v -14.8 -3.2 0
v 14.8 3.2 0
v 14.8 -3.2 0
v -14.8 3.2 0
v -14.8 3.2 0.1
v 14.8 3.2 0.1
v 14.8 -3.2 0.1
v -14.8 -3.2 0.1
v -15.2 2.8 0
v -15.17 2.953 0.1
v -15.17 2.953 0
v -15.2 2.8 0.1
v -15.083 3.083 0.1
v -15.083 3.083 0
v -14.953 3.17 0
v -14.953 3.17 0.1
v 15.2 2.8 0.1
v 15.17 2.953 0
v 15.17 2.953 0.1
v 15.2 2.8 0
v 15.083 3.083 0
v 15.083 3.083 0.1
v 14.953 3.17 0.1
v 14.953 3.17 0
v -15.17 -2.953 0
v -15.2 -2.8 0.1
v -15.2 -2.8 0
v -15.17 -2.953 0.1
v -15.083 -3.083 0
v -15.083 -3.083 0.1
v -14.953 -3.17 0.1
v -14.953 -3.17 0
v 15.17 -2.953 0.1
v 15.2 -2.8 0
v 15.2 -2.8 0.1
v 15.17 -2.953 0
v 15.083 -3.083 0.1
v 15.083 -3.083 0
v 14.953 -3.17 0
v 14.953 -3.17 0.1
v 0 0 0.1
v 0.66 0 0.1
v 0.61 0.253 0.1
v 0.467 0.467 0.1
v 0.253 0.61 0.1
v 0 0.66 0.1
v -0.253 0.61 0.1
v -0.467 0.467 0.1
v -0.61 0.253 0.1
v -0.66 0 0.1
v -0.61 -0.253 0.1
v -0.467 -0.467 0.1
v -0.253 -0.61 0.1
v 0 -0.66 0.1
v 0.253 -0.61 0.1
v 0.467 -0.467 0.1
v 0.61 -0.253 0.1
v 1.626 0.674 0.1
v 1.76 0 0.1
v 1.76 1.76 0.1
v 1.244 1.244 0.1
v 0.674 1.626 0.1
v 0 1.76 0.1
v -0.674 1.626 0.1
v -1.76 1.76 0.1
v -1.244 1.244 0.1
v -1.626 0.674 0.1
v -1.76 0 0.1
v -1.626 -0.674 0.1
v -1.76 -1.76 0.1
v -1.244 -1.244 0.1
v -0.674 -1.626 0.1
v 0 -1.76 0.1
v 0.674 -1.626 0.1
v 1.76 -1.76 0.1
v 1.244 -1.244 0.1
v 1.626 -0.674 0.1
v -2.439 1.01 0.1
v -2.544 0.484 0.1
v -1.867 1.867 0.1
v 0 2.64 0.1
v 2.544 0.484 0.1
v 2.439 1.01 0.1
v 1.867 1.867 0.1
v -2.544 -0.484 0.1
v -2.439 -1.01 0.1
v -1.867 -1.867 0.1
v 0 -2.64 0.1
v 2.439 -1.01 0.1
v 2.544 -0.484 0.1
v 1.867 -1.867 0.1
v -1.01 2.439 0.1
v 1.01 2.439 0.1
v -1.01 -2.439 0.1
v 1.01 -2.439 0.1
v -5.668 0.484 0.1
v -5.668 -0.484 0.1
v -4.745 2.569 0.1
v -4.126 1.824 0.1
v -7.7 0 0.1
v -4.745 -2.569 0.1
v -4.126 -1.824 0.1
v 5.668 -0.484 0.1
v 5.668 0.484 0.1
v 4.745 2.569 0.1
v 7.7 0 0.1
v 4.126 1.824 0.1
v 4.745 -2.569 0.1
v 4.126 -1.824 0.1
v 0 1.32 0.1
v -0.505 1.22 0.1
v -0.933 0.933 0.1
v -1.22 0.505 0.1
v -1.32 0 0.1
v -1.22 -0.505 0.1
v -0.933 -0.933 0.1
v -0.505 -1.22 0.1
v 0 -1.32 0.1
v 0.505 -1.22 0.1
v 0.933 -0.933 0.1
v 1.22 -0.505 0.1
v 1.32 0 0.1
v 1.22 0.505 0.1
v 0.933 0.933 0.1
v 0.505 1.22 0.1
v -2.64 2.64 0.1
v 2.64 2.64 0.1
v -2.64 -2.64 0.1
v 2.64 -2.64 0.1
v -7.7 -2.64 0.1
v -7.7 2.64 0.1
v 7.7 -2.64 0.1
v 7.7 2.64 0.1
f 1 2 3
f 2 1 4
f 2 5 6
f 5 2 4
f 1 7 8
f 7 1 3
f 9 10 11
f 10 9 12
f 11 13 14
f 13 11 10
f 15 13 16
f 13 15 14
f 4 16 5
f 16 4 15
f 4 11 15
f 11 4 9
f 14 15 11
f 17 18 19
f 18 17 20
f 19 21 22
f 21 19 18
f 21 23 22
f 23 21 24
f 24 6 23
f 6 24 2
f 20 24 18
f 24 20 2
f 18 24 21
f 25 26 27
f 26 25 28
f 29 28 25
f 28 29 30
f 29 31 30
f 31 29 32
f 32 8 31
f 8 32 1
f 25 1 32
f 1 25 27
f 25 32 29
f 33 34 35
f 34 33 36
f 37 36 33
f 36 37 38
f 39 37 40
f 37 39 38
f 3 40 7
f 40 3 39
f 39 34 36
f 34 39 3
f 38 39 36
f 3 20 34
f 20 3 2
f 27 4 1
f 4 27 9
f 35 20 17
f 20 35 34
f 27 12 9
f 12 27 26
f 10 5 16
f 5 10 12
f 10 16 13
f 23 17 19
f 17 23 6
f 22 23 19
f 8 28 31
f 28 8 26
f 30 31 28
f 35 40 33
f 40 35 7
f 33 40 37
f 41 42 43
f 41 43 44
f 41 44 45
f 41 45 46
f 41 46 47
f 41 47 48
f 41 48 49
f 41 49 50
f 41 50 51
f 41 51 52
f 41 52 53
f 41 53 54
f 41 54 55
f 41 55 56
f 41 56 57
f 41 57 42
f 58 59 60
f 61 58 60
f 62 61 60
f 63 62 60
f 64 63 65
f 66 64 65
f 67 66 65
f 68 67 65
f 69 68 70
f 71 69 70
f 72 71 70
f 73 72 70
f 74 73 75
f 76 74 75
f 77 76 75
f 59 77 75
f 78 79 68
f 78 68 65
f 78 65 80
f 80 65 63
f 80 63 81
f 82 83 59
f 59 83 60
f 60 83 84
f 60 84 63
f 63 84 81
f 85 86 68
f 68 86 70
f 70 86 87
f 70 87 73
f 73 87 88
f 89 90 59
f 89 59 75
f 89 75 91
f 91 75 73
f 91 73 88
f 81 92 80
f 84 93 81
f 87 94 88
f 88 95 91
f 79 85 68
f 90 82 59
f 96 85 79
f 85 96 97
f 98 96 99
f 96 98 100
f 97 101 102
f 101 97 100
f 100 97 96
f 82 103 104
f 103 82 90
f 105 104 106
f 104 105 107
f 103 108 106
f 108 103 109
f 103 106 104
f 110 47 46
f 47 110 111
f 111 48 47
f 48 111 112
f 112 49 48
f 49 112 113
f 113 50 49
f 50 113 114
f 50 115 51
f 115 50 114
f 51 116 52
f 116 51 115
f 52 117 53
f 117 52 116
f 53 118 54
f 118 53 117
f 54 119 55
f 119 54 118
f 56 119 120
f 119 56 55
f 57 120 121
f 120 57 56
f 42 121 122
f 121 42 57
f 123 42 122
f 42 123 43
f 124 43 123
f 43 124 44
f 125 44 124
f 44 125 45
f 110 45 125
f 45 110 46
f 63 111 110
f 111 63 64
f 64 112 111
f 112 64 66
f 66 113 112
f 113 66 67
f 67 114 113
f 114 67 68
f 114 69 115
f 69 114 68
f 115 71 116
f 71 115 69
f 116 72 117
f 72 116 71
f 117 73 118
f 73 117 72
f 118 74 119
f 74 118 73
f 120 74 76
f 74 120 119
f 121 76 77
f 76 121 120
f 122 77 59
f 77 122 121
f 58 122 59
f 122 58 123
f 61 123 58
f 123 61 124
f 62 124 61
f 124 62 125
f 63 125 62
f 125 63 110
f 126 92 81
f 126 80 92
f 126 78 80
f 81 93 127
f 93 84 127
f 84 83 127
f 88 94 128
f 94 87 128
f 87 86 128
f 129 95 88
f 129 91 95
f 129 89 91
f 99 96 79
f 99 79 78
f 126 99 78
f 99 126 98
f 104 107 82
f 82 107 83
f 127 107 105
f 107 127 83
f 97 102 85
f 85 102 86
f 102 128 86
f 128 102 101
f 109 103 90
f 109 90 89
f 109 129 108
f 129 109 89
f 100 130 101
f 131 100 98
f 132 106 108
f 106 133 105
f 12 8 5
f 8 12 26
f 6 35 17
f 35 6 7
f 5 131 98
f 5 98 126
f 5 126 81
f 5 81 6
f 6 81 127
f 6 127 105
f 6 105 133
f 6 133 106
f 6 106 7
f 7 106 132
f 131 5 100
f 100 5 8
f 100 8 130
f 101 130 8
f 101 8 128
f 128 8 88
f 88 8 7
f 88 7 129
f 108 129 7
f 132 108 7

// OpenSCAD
// file: ../p/empty.scad
use <../lib.scad>
function ldraw_lib__empty() = [
// 0 Empty
// 0 Name: empty.dat
// 0 Author: Steffen [Steffen]
// 0 !LDRAW_ORG Primitive UPDATE 2015-01
// 0 !LICENSE Licensed under CC BY 4.0 : see CAreadme.txt
// 
// 0 BFC CERTIFY CCW
  [0,"BFC","CERTIFY"],
  [0,"BFC","CCW"],
// 
// 0 !HISTORY 2015-10-11 [PTadmin] Official Update 2015-01
// 
// 
// 0 // Tool MLCad cannot handle really empty files. This file is used as a workaround.
// 0 // It exceptionally contains forbidden non-LDRAW standard syntax to satisfy MLCad until it is fixed OR a different editor has become the de-facto LDRAW standard.
// 0 // The line being used here is an "impossible" conditional line which never should be visible,
// 0 // additionally hidden by a syntax explicitly hiding it from displaying.
// 
// 0 MLCAD HIDE 5 24 0 0 0 0.0001 0 0 0.0001 -0.0001 0 0 0 0
];
module ldraw_lib__empty(step=0, col=false, unit=2/5, alt=false, line=0.2, solid=!$preview)
    makepoly(ldraw_lib__empty(), step=step, col=col, unit=unit, alt=alt, line=line, solid=solid);
ldraw_lib__empty(line=0.2);
// file: ../p/4-4ndis.scad
use <../lib.scad>
function ldraw_lib__4_4ndis() = [
// 0 Disc Negative 1.0
// 0 Name: 4-4ndis.dat
// 0 Author: James Jessiman
// 0 !LDRAW_ORG Primitive UPDATE 2012-01
// 0 !LICENSE Licensed under CC BY 4.0 : see CAreadme.txt
// 
// 0 BFC CERTIFY CCW
  [0,"BFC","CERTIFY"],
  [0,"BFC","CCW"],
// 
// 0 !HISTORY 2002-03-23 [sbliss] Added BFC statement; compacted code
// 0 !HISTORY 2002-04-25 [PTadmin] Official Update 2002-02
// 0 !HISTORY 2007-06-24 [PTadmin] Header formatted for Contributor Agreement
// 0 !HISTORY 2008-07-01 [PTadmin] Official Update 2008-01
// 0 !HISTORY 2012-02-16 [Philo] Changed to CCW
// 0 !HISTORY 2012-03-30 [PTadmin] Official Update 2012-01
// 
// 
// 3 16 0.9239 0 0.3827 1 0 0 1 0 1
  [3,16,0.9239,0,0.3827,1,0,0,1,0,1],
// 3 16 0.7071 0 0.7071 0.9239 0 0.3827 1 0 1
  [3,16,0.7071,0,0.7071,0.9239,0,0.3827,1,0,1],
// 3 16 0.3827 0 0.9239 0.7071 0 0.7071 1 0 1
  [3,16,0.3827,0,0.9239,0.7071,0,0.7071,1,0,1],
// 3 16 0 0 1 0.3827 0 0.9239 1 0 1
  [3,16,0,0,1,0.3827,0,0.9239,1,0,1],
// 3 16 -0.3827 0 0.9239 0 0 1 -1 0 1
  [3,16,-0.3827,0,0.9239,0,0,1,-1,0,1],
// 3 16 -0.7071 0 0.7071 -0.3827 0 0.9239 -1 0 1
  [3,16,-0.7071,0,0.7071,-0.3827,0,0.9239,-1,0,1],
// 3 16 -0.9239 0 0.3827 -0.7071 0 0.7071 -1 0 1
  [3,16,-0.9239,0,0.3827,-0.7071,0,0.7071,-1,0,1],
// 3 16 -1 0 0 -0.9239 0 0.3827 -1 0 1
  [3,16,-1,0,0,-0.9239,0,0.3827,-1,0,1],
// 3 16 -0.9239 0 -0.3827 -1 0 0 -1 0 -1
  [3,16,-0.9239,0,-0.3827,-1,0,0,-1,0,-1],
// 3 16 -0.7071 0 -0.7071 -0.9239 0 -0.3827 -1 0 -1
  [3,16,-0.7071,0,-0.7071,-0.9239,0,-0.3827,-1,0,-1],
// 3 16 -0.3827 0 -0.9239 -0.7071 0 -0.7071 -1 0 -1
  [3,16,-0.3827,0,-0.9239,-0.7071,0,-0.7071,-1,0,-1],
// 3 16 0 0 -1 -0.3827 0 -0.9239 -1 0 -1
  [3,16,0,0,-1,-0.3827,0,-0.9239,-1,0,-1],
// 3 16 0.3827 0 -0.9239 0 0 -1 1 0 -1
  [3,16,0.3827,0,-0.9239,0,0,-1,1,0,-1],
// 3 16 0.7071 0 -0.7071 0.3827 0 -0.9239 1 0 -1
  [3,16,0.7071,0,-0.7071,0.3827,0,-0.9239,1,0,-1],
// 3 16 0.9239 0 -0.3827 0.7071 0 -0.7071 1 0 -1
  [3,16,0.9239,0,-0.3827,0.7071,0,-0.7071,1,0,-1],
// 3 16 1 0 0 0.9239 0 -0.3827 1 0 -1
  [3,16,1,0,0,0.9239,0,-0.3827,1,0,-1],
];
module ldraw_lib__4_4ndis(step=0, col=false, unit=2/5, alt=false, line=0.2, solid=!$preview)
    makepoly(ldraw_lib__4_4ndis(), step=step, col=col, unit=unit, alt=alt, line=line, solid=solid);
ldraw_lib__4_4ndis(line=0.2);
// file: ../p/4-4disc.scad
use <../lib.scad>
function ldraw_lib__4_4disc() = [
// 0 Disc 1.0
// 0 Name: 4-4disc.dat
// 0 Author: James Jessiman
// 0 !LDRAW_ORG Primitive UPDATE 2002-02
// 0 !LICENSE Licensed under CC BY 4.0 : see CAreadme.txt
// 
// 0 BFC CERTIFY CCW
  [0,"BFC","CERTIFY"],
  [0,"BFC","CCW"],
// 
// 0 !HISTORY 1998-12-15 [PTadmin] Official Update 1998-10
// 0 !HISTORY 2002-03-23 [sbliss] Added BFC statement
// 0 !HISTORY 2002-04-25 [PTadmin] Official Update 2002-02
// 0 !HISTORY 2007-06-24 [PTadmin] Header formatted for Contributor Agreement
// 0 !HISTORY 2008-07-01 [PTadmin] Official Update 2008-01
// 
// 
// 3 16 0 0 0 1 0 0 0.9239 0 0.3827
  [3,16,0,0,0,1,0,0,0.9239,0,0.3827],
// 3 16 0 0 0 0.9239 0 0.3827 0.7071 0 0.7071
  [3,16,0,0,0,0.9239,0,0.3827,0.7071,0,0.7071],
// 3 16 0 0 0 0.7071 0 0.7071 0.3827 0 0.9239
  [3,16,0,0,0,0.7071,0,0.7071,0.3827,0,0.9239],
// 3 16 0 0 0 0.3827 0 0.9239 0 0 1
  [3,16,0,0,0,0.3827,0,0.9239,0,0,1],
// 3 16 0 0 0 0 0 1 -0.3827 0 0.9239
  [3,16,0,0,0,0,0,1,-0.3827,0,0.9239],
// 3 16 0 0 0 -0.3827 0 0.9239 -0.7071 0 0.7071
  [3,16,0,0,0,-0.3827,0,0.9239,-0.7071,0,0.7071],
// 3 16 0 0 0 -0.7071 0 0.7071 -0.9239 0 0.3827
  [3,16,0,0,0,-0.7071,0,0.7071,-0.9239,0,0.3827],
// 3 16 0 0 0 -0.9239 0 0.3827 -1 0 -0
  [3,16,0,0,0,-0.9239,0,0.3827,-1,0,-0],
// 3 16 0 0 0 -1 0 -0 -0.9239 0 -0.3827
  [3,16,0,0,0,-1,0,-0,-0.9239,0,-0.3827],
// 3 16 0 0 0 -0.9239 0 -0.3827 -0.7071 0 -0.7071
  [3,16,0,0,0,-0.9239,0,-0.3827,-0.7071,0,-0.7071],
// 3 16 0 0 0 -0.7071 0 -0.7071 -0.3827 0 -0.9239
  [3,16,0,0,0,-0.7071,0,-0.7071,-0.3827,0,-0.9239],
// 3 16 0 0 0 -0.3827 0 -0.9239 0 0 -1
  [3,16,0,0,0,-0.3827,0,-0.9239,0,0,-1],
// 3 16 0 0 0 0 0 -1 0.3827 0 -0.9239
  [3,16,0,0,0,0,0,-1,0.3827,0,-0.9239],
// 3 16 0 0 0 0.3827 0 -0.9239 0.7071 0 -0.7071
  [3,16,0,0,0,0.3827,0,-0.9239,0.7071,0,-0.7071],
// 3 16 0 0 0 0.7071 0 -0.7071 0.9239 0 -0.3827
  [3,16,0,0,0,0.7071,0,-0.7071,0.9239,0,-0.3827],
// 3 16 0 0 0 0.9239 0 -0.3827 1 0 0
  [3,16,0,0,0,0.9239,0,-0.3827,1,0,0],
// 0
];
module ldraw_lib__4_4disc(step=0, col=false, unit=2/5, alt=false, line=0.2, solid=!$preview)
    makepoly(ldraw_lib__4_4disc(), step=step, col=col, unit=unit, alt=alt, line=line, solid=solid);
ldraw_lib__4_4disc(line=0.2);
// file: ../p/1-8chrd.scad
use <../lib.scad>
function ldraw_lib__1_8chrd() = [
// 0 Chord 0.125
// 0 Name: 1-8chrd.dat
// 0 Author: Orion Pobursky [OrionP]
// 0 !LDRAW_ORG Primitive UPDATE 2023-05
// 0 !LICENSE Licensed under CC BY 4.0 : see CAreadme.txt
// 
// 0 BFC CERTIFY CCW
  [0,"BFC","CERTIFY"],
  [0,"BFC","CCW"],
// 
// 0 !HISTORY 2004-04-22 [PTadmin] Official Update 2004-02
// 0 !HISTORY 2007-06-22 [PTadmin] Header formatted for Contributor Agreement
// 0 !HISTORY 2008-07-01 [PTadmin] Official Update 2008-01
// 0 !HISTORY 2023-10-27 [OrionP] Rebuilt with PrimGen2, original author westrate
// 0 !HISTORY 2023-10-31 [OrionP] Official Update 2023-05
// 
// 3 16 1 0 0 0.9239 0 0.3827 0.7071 0 0.7071
  [3,16,1,0,0,0.9239,0,0.3827,0.7071,0,0.7071],
];
module ldraw_lib__1_8chrd(step=0, col=false, unit=2/5, alt=false, line=0.2, solid=!$preview)
    makepoly(ldraw_lib__1_8chrd(), step=step, col=col, unit=unit, alt=alt, line=line, solid=solid);
ldraw_lib__1_8chrd(line=0.2);
// file: ../p/1-16chrd.scad
use <../lib.scad>
use <empty.scad>
function ldraw_lib__1_16chrd() = [
// 0 Chord 0.0625
// 0 Name: 1-16chrd.dat
// 0 Author: Philippe Hurbain [Philo]
// 0 !LDRAW_ORG Primitive UPDATE 2015-01
// 0 !LICENSE Licensed under CC BY 4.0 : see CAreadme.txt
// 
// 0 BFC CERTIFY CCW
  [0,"BFC","CERTIFY"],
  [0,"BFC","CCW"],
// 
// 0 !HISTORY 2015-10-11 [PTadmin] Official Update 2015-01
// 
// 
// 0 // This file is intentionally empty because at the current \P resolution,
// 0 // an 1-16chrd is actually empty. However, this file still is present
// 0 // to allow tools to do primitives substition and fill in a real chrd here,
// 0 // or, if desired, to substitute this with the hi-res 48\1-16chrd.
// 
// 0 // This file is based on an idea by Darats at http://forums.ldraw.org/read.php?19,14500,14500#msg-14500
// 
// 1 16 0 0 0 1 0 0 0 1 0 0 0 1 empty.dat
  [1,16,0,0,0,1,0,0,0,1,0,0,0,1, ldraw_lib__empty()],
];
module ldraw_lib__1_16chrd(step=0, col=false, unit=2/5, alt=false, line=0.2, solid=!$preview)
    makepoly(ldraw_lib__1_16chrd(), step=step, col=col, unit=unit, alt=alt, line=line, solid=solid);
ldraw_lib__1_16chrd(line=0.2);
// file: ../p/4-4ring3.scad
use <../lib.scad>
function ldraw_lib__4_4ring3() = [
// 0 Ring  3 x 1.0
// 0 Name: 4-4ring3.dat
// 0 Author: James Jessiman
// 0 !LDRAW_ORG Primitive UPDATE 2009-01
// 0 !LICENSE Licensed under CC BY 4.0 : see CAreadme.txt
// 
// 0 BFC CERTIFY CCW
  [0,"BFC","CERTIFY"],
  [0,"BFC","CCW"],
// 
// 0 !HISTORY 1998-12-15 [PTadmin] Official Update 1998-10
// 0 !HISTORY 2002-04-05 [hafhead] Added BFC statement
// 0 !HISTORY 2002-04-25 [PTadmin] Official Update 2002-02
// 0 !HISTORY 2007-06-24 [PTadmin] Header formatted for Contributor Agreement
// 0 !HISTORY 2008-07-01 [PTadmin] Official Update 2008-01
// 0 !HISTORY 2008-08-26 [cwdee] Switch polygon winding and rename
// 0 !HISTORY 2009-05-02 [PTadmin] Official Update 2009-01
// 
// 
// 4 16 -1.5308 0 3.6956 -1.1481 0 2.7717 0 0 3 0 0 4
  [4,16,-1.5308,0,3.6956,-1.1481,0,2.7717,0,0,3,0,0,4],
// 4 16 -2.8284 0 2.8284 -2.1213 0 2.1213 -1.1481 0 2.7717 -1.5308 0 3.6956
  [4,16,-2.8284,0,2.8284,-2.1213,0,2.1213,-1.1481,0,2.7717,-1.5308,0,3.6956],
// 4 16 -3.6956 0 1.5308 -2.7717 0 1.1481 -2.1213 0 2.1213 -2.8284 0 2.8284
  [4,16,-3.6956,0,1.5308,-2.7717,0,1.1481,-2.1213,0,2.1213,-2.8284,0,2.8284],
// 4 16 -4 0 0 -3 0 0 -2.7717 0 1.1481 -3.6956 0 1.5308
  [4,16,-4,0,0,-3,0,0,-2.7717,0,1.1481,-3.6956,0,1.5308],
// 4 16 -3.6956 0 -1.5308 -2.7717 0 -1.1481 -3 0 0 -4 0 0
  [4,16,-3.6956,0,-1.5308,-2.7717,0,-1.1481,-3,0,0,-4,0,0],
// 4 16 -2.8284 0 -2.8284 -2.1213 0 -2.1213 -2.7717 0 -1.1481 -3.6956 0 -1.5308
  [4,16,-2.8284,0,-2.8284,-2.1213,0,-2.1213,-2.7717,0,-1.1481,-3.6956,0,-1.5308],
// 4 16 -1.5308 0 -3.6956 -1.1481 0 -2.7717 -2.1213 0 -2.1213 -2.8284 0 -2.8284
  [4,16,-1.5308,0,-3.6956,-1.1481,0,-2.7717,-2.1213,0,-2.1213,-2.8284,0,-2.8284],
// 4 16 0 0 -4 0 0 -3 -1.1481 0 -2.7717 -1.5308 0 -3.6956
  [4,16,0,0,-4,0,0,-3,-1.1481,0,-2.7717,-1.5308,0,-3.6956],
// 4 16 1.5308 0 -3.6956 1.1481 0 -2.7717 0 0 -3 0 0 -4
  [4,16,1.5308,0,-3.6956,1.1481,0,-2.7717,0,0,-3,0,0,-4],
// 4 16 2.8284 0 -2.8284 2.1213 0 -2.1213 1.1481 0 -2.7717 1.5308 0 -3.6956
  [4,16,2.8284,0,-2.8284,2.1213,0,-2.1213,1.1481,0,-2.7717,1.5308,0,-3.6956],
// 4 16 3.6956 0 -1.5308 2.7717 0 -1.1481 2.1213 0 -2.1213 2.8284 0 -2.8284
  [4,16,3.6956,0,-1.5308,2.7717,0,-1.1481,2.1213,0,-2.1213,2.8284,0,-2.8284],
// 4 16 4 0 0 3 0 0 2.7717 0 -1.1481 3.6956 0 -1.5308
  [4,16,4,0,0,3,0,0,2.7717,0,-1.1481,3.6956,0,-1.5308],
// 4 16 3.6956 0 1.5308 2.7717 0 1.1481 3 0 0 4 0 0
  [4,16,3.6956,0,1.5308,2.7717,0,1.1481,3,0,0,4,0,0],
// 4 16 2.8284 0 2.8284 2.1213 0 2.1213 2.7717 0 1.1481 3.6956 0 1.5308
  [4,16,2.8284,0,2.8284,2.1213,0,2.1213,2.7717,0,1.1481,3.6956,0,1.5308],
// 4 16 1.5308 0 3.6956 1.1481 0 2.7717 2.1213 0 2.1213 2.8284 0 2.8284
  [4,16,1.5308,0,3.6956,1.1481,0,2.7717,2.1213,0,2.1213,2.8284,0,2.8284],
// 4 16 0 0 4 0 0 3 1.1481 0 2.7717 1.5308 0 3.6956
  [4,16,0,0,4,0,0,3,1.1481,0,2.7717,1.5308,0,3.6956],
// 0
];
module ldraw_lib__4_4ring3(step=0, col=false, unit=2/5, alt=false, line=0.2, solid=!$preview)
    makepoly(ldraw_lib__4_4ring3(), step=step, col=col, unit=unit, alt=alt, line=line, solid=solid);
ldraw_lib__4_4ring3(line=0.2);
// file: ../p/4-4ring1.scad
use <../lib.scad>
function ldraw_lib__4_4ring1() = [
// 0 Ring  1 x 1.0
// 0 Name: 4-4ring1.dat
// 0 Author: James Jessiman
// 0 !LDRAW_ORG Primitive UPDATE 2009-01
// 0 !LICENSE Licensed under CC BY 4.0 : see CAreadme.txt
// 
// 0 BFC CERTIFY CCW
  [0,"BFC","CERTIFY"],
  [0,"BFC","CCW"],
// 
// 0 !HISTORY 1998-12-15 [PTadmin] Official Update 1998-10
// 0 !HISTORY 2002-04-08 [BrickCaster] Modified for BFC compliance
// 0 !HISTORY 2002-04-25 [PTadmin] Official Update 2002-02
// 0 !HISTORY 2007-06-24 [PTadmin] Header formatted for Contributor Agreement
// 0 !HISTORY 2008-07-01 [PTadmin] Official Update 2008-01
// 0 !HISTORY 2008-08-26 [cwdee] Switch polygon winding and rename
// 0 !HISTORY 2009-05-02 [PTadmin] Official Update 2009-01
// 
// 
// 4 16 -0.7654 0 1.8478 -0.3827 0 0.9239 0 0 1 0 0 2
  [4,16,-0.7654,0,1.8478,-0.3827,0,0.9239,0,0,1,0,0,2],
// 4 16 -1.4142 0 1.4142 -0.7071 0 0.7071 -0.3827 0 0.9239 -0.7654 0 1.8478
  [4,16,-1.4142,0,1.4142,-0.7071,0,0.7071,-0.3827,0,0.9239,-0.7654,0,1.8478],
// 4 16 -1.8478 0 0.7654 -0.9239 0 0.3827 -0.7071 0 0.7071 -1.4142 0 1.41420
  [4,16,-1.8478,0,0.7654,-0.9239,0,0.3827,-0.7071,0,0.7071,-1.4142,0,1.41420],
// 4 16 -2 0 0 -1 0 0 -0.9239 0 0.3827 -1.8478 0 0.7654
  [4,16,-2,0,0,-1,0,0,-0.9239,0,0.3827,-1.8478,0,0.7654],
// 4 16 -1.8478 0 -0.7654 -0.9239 0 -0.3827 -1 0 0 -2 0 0
  [4,16,-1.8478,0,-0.7654,-0.9239,0,-0.3827,-1,0,0,-2,0,0],
// 4 16 -1.4142 0 -1.4142 -0.7071 0 -0.7071 -0.9239 0 -0.3827 -1.8478 0 -0.7654
  [4,16,-1.4142,0,-1.4142,-0.7071,0,-0.7071,-0.9239,0,-0.3827,-1.8478,0,-0.7654],
// 4 16 -0.7654 0 -1.8478 -0.3827 0 -0.9239 -0.7071 0 -0.7071 -1.4142 0 -1.4142
  [4,16,-0.7654,0,-1.8478,-0.3827,0,-0.9239,-0.7071,0,-0.7071,-1.4142,0,-1.4142],
// 4 16 0 0 -2 0 0 -1 -0.3827 0 -0.9239 -0.7654 0 -1.8478
  [4,16,0,0,-2,0,0,-1,-0.3827,0,-0.9239,-0.7654,0,-1.8478],
// 4 16 0.7654 0 -1.8478 0.3827 0 -0.9239 0 0 -1 0 0 -2
  [4,16,0.7654,0,-1.8478,0.3827,0,-0.9239,0,0,-1,0,0,-2],
// 4 16 1.4142 0 -1.4142 0.7071 0 -0.7071 0.3827 0 -0.9239 0.7654 0 -1.8478
  [4,16,1.4142,0,-1.4142,0.7071,0,-0.7071,0.3827,0,-0.9239,0.7654,0,-1.8478],
// 4 16 1.8478 0 -0.7654 0.9239 0 -0.3827 0.7071 0 -0.7071 1.4142 0 -1.4142
  [4,16,1.8478,0,-0.7654,0.9239,0,-0.3827,0.7071,0,-0.7071,1.4142,0,-1.4142],
// 4 16 2 0 0 1 0 0 0.9239 0 -0.3827 1.8478 0 -0.7654
  [4,16,2,0,0,1,0,0,0.9239,0,-0.3827,1.8478,0,-0.7654],
// 4 16 1.8478 0 0.7654 0.9239 0 0.3827 1 0 0 2 0 0
  [4,16,1.8478,0,0.7654,0.9239,0,0.3827,1,0,0,2,0,0],
// 4 16 1.4142 0 1.4142 0.7071 0 0.7071 0.9239 0 0.3827 1.8478 0 0.7654
  [4,16,1.4142,0,1.4142,0.7071,0,0.7071,0.9239,0,0.3827,1.8478,0,0.7654],
// 4 16 0.7654 0 1.8478 0.3827 0 0.9239 0.7071 0 0.7071 1.4142 0 1.4142
  [4,16,0.7654,0,1.8478,0.3827,0,0.9239,0.7071,0,0.7071,1.4142,0,1.4142],
// 4 16 0 0 2 0 0 1 0.3827 0 0.9239 0.7654 0 1.8478
  [4,16,0,0,2,0,0,1,0.3827,0,0.9239,0.7654,0,1.8478],
// 0
];
module ldraw_lib__4_4ring1(step=0, col=false, unit=2/5, alt=false, line=0.2, solid=!$preview)
    makepoly(ldraw_lib__4_4ring1(), step=step, col=col, unit=unit, alt=alt, line=line, solid=solid);
ldraw_lib__4_4ring1(line=0.2);
// file: ../p/3-16ndis.scad
use <../lib.scad>
function ldraw_lib__3_16ndis() = [
// 0 Disc Negative 0.1875
// 0 Name: 3-16ndis.dat
// 0 Author: Guy Vivan [guyvivan]
// 0 !LDRAW_ORG Primitive UPDATE 2009-01
// 0 !LICENSE Licensed under CC BY 2.0 and CC BY 4.0 : see CAreadme.txt
// 
// 0 BFC CERTIFY CCW
  [0,"BFC","CERTIFY"],
  [0,"BFC","CCW"],
// 
// 0 !HISTORY 2009-05-02 [PTadmin] Official Update 2009-01
// 
// 
// 3 16 1 0 1 0.9239 0 0.3827 1 0 0
  [3,16,1,0,1,0.9239,0,0.3827,1,0,0],
// 3 16 1 0 1 0.7071 0 0.7071 0.9239 0 0.3827
  [3,16,1,0,1,0.7071,0,0.7071,0.9239,0,0.3827],
// 3 16 1 0 1 0.3827 0 0.9239 0.7071 0 0.7071
  [3,16,1,0,1,0.3827,0,0.9239,0.7071,0,0.7071],
// 
// 0 end of file
// 
];
module ldraw_lib__3_16ndis(step=0, col=false, unit=2/5, alt=false, line=0.2, solid=!$preview)
    makepoly(ldraw_lib__3_16ndis(), step=step, col=col, unit=unit, alt=alt, line=line, solid=solid);
ldraw_lib__3_16ndis(line=0.2);
// file: ../p/logo-train-2006.scad
use <../lib.scad>
use <1-16chrd.scad>
use <1-8chrd.scad>
use <4-4disc.scad>
use <4-4ndis.scad>
function ldraw_lib__logo_train_2006() = [
// 0 Logo Train 2006
// 0 Name: logo-train-2006.dat
// 0 Author: Gerald Lasser [GeraldLasser]
// 0 !LDRAW_ORG Primitive UPDATE 2023-07
// 0 !LICENSE Licensed under CC BY 4.0 : see CAreadme.txt
// 
// 0 BFC CERTIFY CCW
  [0,"BFC","CERTIFY"],
  [0,"BFC","CCW"],
// 
// 0 !HISTORY 2023-12-31 [OrionP] Official Update 2023-07
// 
// 
// 1 16 0 -.25 0 3 0 0 0 1 0 0 0 3 4-4disc.dat
  [1,16,0,-.25,0,3,0,0,0,1,0,0,0,3, ldraw_lib__4_4disc()],
// 1 16 0 -.25 0 8 0 0 0 1 0 0 0 8 4-4ndis.dat
  [1,16,0,-.25,0,8,0,0,0,1,0,0,0,8, ldraw_lib__4_4ndis()],
// 3 16 -11.0868 -.25 4.5924 -11.5625 -.25 2.2 -8 -.25 0
  [3,16,-11.0868,-.25,4.5924,-11.5625,-.25,2.2,-8,-.25,0],
// 3 16 -11.0868 -.25 4.5924 -8 -.25 0 -8 -.25 8
  [3,16,-11.0868,-.25,4.5924,-8,-.25,0,-8,-.25,8],
// 3 16 -11.0868 -.25 4.5924 -8 -.25 8 -8.4852 -.25 8.4852
  [3,16,-11.0868,-.25,4.5924,-8,-.25,8,-8.4852,-.25,8.4852],
// 3 16 -8.4852 -.25 8.4852 -8 -.25 8 0 -.25 8
  [3,16,-8.4852,-.25,8.4852,-8,-.25,8,0,-.25,8],
// 3 16 -8.4852 -.25 8.4852 0 -.25 8 0 -.25 12
  [3,16,-8.4852,-.25,8.4852,0,-.25,8,0,-.25,12],
// 3 16 11.5625 -.25 2.2 11.0868 -.25 4.5924 8 -.25 0
  [3,16,11.5625,-.25,2.2,11.0868,-.25,4.5924,8,-.25,0],
// 3 16 8 -.25 0 11.0868 -.25 4.5924 8 -.25 8
  [3,16,8,-.25,0,11.0868,-.25,4.5924,8,-.25,8],
// 3 16 8 -.25 8 11.0868 -.25 4.5924 8.4852 -.25 8.4852
  [3,16,8,-.25,8,11.0868,-.25,4.5924,8.4852,-.25,8.4852],
// 3 16 8 -.25 8 8.4852 -.25 8.4852 0 -.25 8
  [3,16,8,-.25,8,8.4852,-.25,8.4852,0,-.25,8],
// 3 16 0 -.25 8 8.4852 -.25 8.4852 0 -.25 12
  [3,16,0,-.25,8,8.4852,-.25,8.4852,0,-.25,12],
// 
// 3 16 -11.5625 -.25 -2.2 -11.0868 -.25 -4.5924 -8 -.25 0
  [3,16,-11.5625,-.25,-2.2,-11.0868,-.25,-4.5924,-8,-.25,0],
// 3 16 -8 -.25 0 -11.0868 -.25 -4.5924 -8 -.25 -8
  [3,16,-8,-.25,0,-11.0868,-.25,-4.5924,-8,-.25,-8],
// 3 16 -8 -.25 -8 -11.0868 -.25 -4.5924 -8.4852 -.25 -8.4852
  [3,16,-8,-.25,-8,-11.0868,-.25,-4.5924,-8.4852,-.25,-8.4852],
// 3 16 -8 -.25 -8 -8.4852 -.25 -8.4852 0 -.25 -8
  [3,16,-8,-.25,-8,-8.4852,-.25,-8.4852,0,-.25,-8],
// 3 16 0 -.25 -8 -8.4852 -.25 -8.4852 0 -.25 -12
  [3,16,0,-.25,-8,-8.4852,-.25,-8.4852,0,-.25,-12],
// 3 16 11.0868 -.25 -4.5924 11.5625 -.25 -2.2 8 -.25 0
  [3,16,11.0868,-.25,-4.5924,11.5625,-.25,-2.2,8,-.25,0],
// 3 16 11.0868 -.25 -4.5924 8 -.25 0 8 -.25 -8
  [3,16,11.0868,-.25,-4.5924,8,-.25,0,8,-.25,-8],
// 3 16 11.0868 -.25 -4.5924 8 -.25 -8 8.4852 -.25 -8.4852
  [3,16,11.0868,-.25,-4.5924,8,-.25,-8,8.4852,-.25,-8.4852],
// 3 16 8.4852 -.25 -8.4852 8 -.25 -8 0 -.25 -8
  [3,16,8.4852,-.25,-8.4852,8,-.25,-8,0,-.25,-8],
// 3 16 8.4852 -.25 -8.4852 0 -.25 -8 0 -.25 -12
  [3,16,8.4852,-.25,-8.4852,0,-.25,-8,0,-.25,-12],
// 
// 1 16 0 -.25 0 0 0 -12 0 1 0 12 0 0 1-8chrd.dat
  [1,16,0,-.25,0,0,0,-12,0,1,0,12,0,0, ldraw_lib__1_8chrd()],
// 1 16 0 -.25 0 0 0 12 0 1 0 12 0 0 1-8chrd.dat
  [1,16,0,-.25,0,0,0,12,0,1,0,12,0,0, ldraw_lib__1_8chrd()],
// 1 16 0 -.25 0 -8.48528 0 -8.48528 0 1 0 8.48528 0 -8.48528 1-16chrd.dat
  [1,16,0,-.25,0,-8.48528,0,-8.48528,0,1,0,8.48528,0,-8.48528, ldraw_lib__1_16chrd()],
// 1 16 0 -.25 0 8.48528 0 8.48528 0 1 0 8.48528 0 -8.48528 1-16chrd.dat
  [1,16,0,-.25,0,8.48528,0,8.48528,0,1,0,8.48528,0,-8.48528, ldraw_lib__1_16chrd()],
// 1 16 0 -.25 0 0 0 -12 0 1 0 -12 0 0 1-8chrd.dat
  [1,16,0,-.25,0,0,0,-12,0,1,0,-12,0,0, ldraw_lib__1_8chrd()],
// 1 16 0 -.25 0 0 0 12 0 1 0 -12 0 0 1-8chrd.dat
  [1,16,0,-.25,0,0,0,12,0,1,0,-12,0,0, ldraw_lib__1_8chrd()],
// 1 16 0 -.25 0 -8.48528 0 -8.48528 0 1 0 -8.48528 0 8.48528 1-16chrd.dat
  [1,16,0,-.25,0,-8.48528,0,-8.48528,0,1,0,-8.48528,0,8.48528, ldraw_lib__1_16chrd()],
// 1 16 0 -.25 0 8.48528 0 8.48528 0 1 0 -8.48528 0 8.48528 1-16chrd.dat
  [1,16,0,-.25,0,8.48528,0,8.48528,0,1,0,-8.48528,0,8.48528, ldraw_lib__1_16chrd()],
// 
// 3 16 -11.5625 -.25 2.2 -11.5625 -.25 -2.2 -8 -.25 0
  [3,16,-11.5625,-.25,2.2,-11.5625,-.25,-2.2,-8,-.25,0],
// 3 16 11.5625 -.25 -2.2 11.5625 -.25 2.2 8 -.25 0
  [3,16,11.5625,-.25,-2.2,11.5625,-.25,2.2,8,-.25,0],
// 4 16 -25.7625 -.25 2.2 -25.7625 -.25 -2.2 -11.5625 -.25 -2.2 -11.5625 -.25 2.2
  [4,16,-25.7625,-.25,2.2,-25.7625,-.25,-2.2,-11.5625,-.25,-2.2,-11.5625,-.25,2.2],
// 4 16 -35 -.25 0 -25.7625 -.25 2.2 -18.755 -.25 8.2915 -21.5662 -.25 11.6778
  [4,16,-35,-.25,0,-25.7625,-.25,2.2,-18.755,-.25,8.2915,-21.5662,-.25,11.6778],
// 4 16 -18.755 -.25 -8.2915 -25.7625 -.25 -2.2 -35 -.25 0 -21.5662 -.25 -11.6778
  [4,16,-18.755,-.25,-8.2915,-25.7625,-.25,-2.2,-35,-.25,0,-21.5662,-.25,-11.6778],
// 3 16 -35 -.25 0 -25.7625 -.25 -2.2 -25.7625 -.25 2.2
  [3,16,-35,-.25,0,-25.7625,-.25,-2.2,-25.7625,-.25,2.2],
// 4 16 11.5625 -.25 -2.2 25.7625 -.25 -2.2 25.7625 -.25 2.2 11.5625 -.25 2.2
  [4,16,11.5625,-.25,-2.2,25.7625,-.25,-2.2,25.7625,-.25,2.2,11.5625,-.25,2.2],
// 4 16 18.755 -.25 8.2915 25.7625 -.25 2.2 35 -.25 0 21.5662 -.25 11.6778
  [4,16,18.755,-.25,8.2915,25.7625,-.25,2.2,35,-.25,0,21.5662,-.25,11.6778],
// 4 16 35 -.25 0 25.7625 -.25 -2.2 18.755 -.25 -8.2915 21.5662 -.25 -11.6778
  [4,16,35,-.25,0,25.7625,-.25,-2.2,18.755,-.25,-8.2915,21.5662,-.25,-11.6778],
// 3 16 25.7625 -.25 -2.2 35 -.25 0 25.7625 -.25 2.2
  [3,16,25.7625,-.25,-2.2,35,-.25,0,25.7625,-.25,2.2],
];
module ldraw_lib__logo_train_2006(step=0, col=false, unit=2/5, alt=false, line=0.2, solid=!$preview)
    makepoly(ldraw_lib__logo_train_2006(), step=step, col=col, unit=unit, alt=alt, line=line, solid=solid);
ldraw_lib__logo_train_2006(line=0.2);
// file: ../p/logo-train-2006-box.scad
use <../lib.scad>
use <3-16ndis.scad>
use <4-4ring1.scad>
use <4-4ring3.scad>
function ldraw_lib__logo_train_2006_box() = [
// 0 Logo Train 2006 Outer Box
// 0 Name: logo-train-2006-box.dat
// 0 Author: Gerald Lasser [GeraldLasser]
// 0 !LDRAW_ORG Primitive UPDATE 2023-07
// 0 !LICENSE Licensed under CC BY 4.0 : see CAreadme.txt
// 
// 0 BFC CERTIFY CCW
  [0,"BFC","CERTIFY"],
  [0,"BFC","CCW"],
// 
// 0 !HISTORY 2023-12-31 [OrionP] Official Update 2023-07
// 
// 
// 1 16 0 -.25 0 3 0 0 0 1 0 0 0 3 4-4ring1.dat
  [1,16,0,-.25,0,3,0,0,0,1,0,0,0,3, ldraw_lib__4_4ring1()],
// 1 16 0 -.25 0 2 0 0 0 1 0 0 0 2 4-4ring3.dat
  [1,16,0,-.25,0,2,0,0,0,1,0,0,0,2, ldraw_lib__4_4ring3()],
// 1 16 0 -.25 0 0 0 -12 0 1 0 12 0 0 3-16ndis.dat
  [1,16,0,-.25,0,0,0,-12,0,1,0,12,0,0, ldraw_lib__3_16ndis()],
// 1 16 0 -.25 0 0 0 12 0 1 0 12 0 0 3-16ndis.dat
  [1,16,0,-.25,0,0,0,12,0,1,0,12,0,0, ldraw_lib__3_16ndis()],
// 1 16 0 -.25 0 0 0 -12 0 1 0 -12 0 0 3-16ndis.dat
  [1,16,0,-.25,0,0,0,-12,0,1,0,-12,0,0, ldraw_lib__3_16ndis()],
// 1 16 0 -.25 0 0 0 12 0 1 0 -12 0 0 3-16ndis.dat
  [1,16,0,-.25,0,0,0,12,0,1,0,-12,0,0, ldraw_lib__3_16ndis()],
// 
// 3 16 -18.755 -.25 8.2915 -25.7625 -.25 2.2 -11.5625 -.25 2.2
  [3,16,-18.755,-.25,8.2915,-25.7625,-.25,2.2,-11.5625,-.25,2.2],
// 3 16 -18.755 -.25 8.2915 -11.5625 -.25 2.2 -11.0868 -.25 4.5924
  [3,16,-18.755,-.25,8.2915,-11.5625,-.25,2.2,-11.0868,-.25,4.5924],
// 4 16 -12 -.25 12 -21.5662 -.25 11.6778 -18.755 -.25 8.2915 -11.0868 -.25 4.5924
  [4,16,-12,-.25,12,-21.5662,-.25,11.6778,-18.755,-.25,8.2915,-11.0868,-.25,4.5924],
// 3 16 25.7625 -.25 2.2 18.755 -.25 8.2915 11.5625 -.25 2.2
  [3,16,25.7625,-.25,2.2,18.755,-.25,8.2915,11.5625,-.25,2.2],
// 3 16 11.5625 -.25 2.2 18.755 -.25 8.2915 11.0868 -.25 4.5924
  [3,16,11.5625,-.25,2.2,18.755,-.25,8.2915,11.0868,-.25,4.5924],
// 4 16 18.755 -.25 8.2915 21.5662 -.25 11.6778 12 -.25 12 11.0868 -.25 4.5924
  [4,16,18.755,-.25,8.2915,21.5662,-.25,11.6778,12,-.25,12,11.0868,-.25,4.5924],
// 3 16 -25.7625 -.25 -2.2 -18.755 -.25 -8.2915 -11.5625 -.25 -2.2
  [3,16,-25.7625,-.25,-2.2,-18.755,-.25,-8.2915,-11.5625,-.25,-2.2],
// 3 16 -11.5625 -.25 -2.2 -18.755 -.25 -8.2915 -11.0868 -.25 -4.5924
  [3,16,-11.5625,-.25,-2.2,-18.755,-.25,-8.2915,-11.0868,-.25,-4.5924],
// 4 16 -18.755 -.25 -8.2915 -21.5662 -.25 -11.6778 -12 -.25 -12 -11.0868 -.25 -4.5924
  [4,16,-18.755,-.25,-8.2915,-21.5662,-.25,-11.6778,-12,-.25,-12,-11.0868,-.25,-4.5924],
// 3 16 18.755 -.25 -8.2915 25.7625 -.25 -2.2 11.5625 -.25 -2.2
  [3,16,18.755,-.25,-8.2915,25.7625,-.25,-2.2,11.5625,-.25,-2.2],
// 3 16 18.755 -.25 -8.2915 11.5625 -.25 -2.2 11.0868 -.25 -4.5924
  [3,16,18.755,-.25,-8.2915,11.5625,-.25,-2.2,11.0868,-.25,-4.5924],
// 4 16 12 -.25 -12 21.5662 -.25 -11.6778 18.755 -.25 -8.2915 11.0868 -.25 -4.5924
  [4,16,12,-.25,-12,21.5662,-.25,-11.6778,18.755,-.25,-8.2915,11.0868,-.25,-4.5924],
// 
// 3 16 -35 -.25 0 -35 -.25 -12 -21.5662 -.25 -11.6778
  [3,16,-35,-.25,0,-35,-.25,-12,-21.5662,-.25,-11.6778],
// 3 16 -35 -.25 12 -35 -.25 0 -21.5662 -.25 11.6778
  [3,16,-35,-.25,12,-35,-.25,0,-21.5662,-.25,11.6778],
// 3 16 35 -.25 -12 35 -.25 0 21.5662 -.25 -11.6778
  [3,16,35,-.25,-12,35,-.25,0,21.5662,-.25,-11.6778],
// 3 16 35 -.25 0 35 -.25 12 21.5662 -.25 11.6778
  [3,16,35,-.25,0,35,-.25,12,21.5662,-.25,11.6778],
];
module ldraw_lib__logo_train_2006_box(step=0, col=false, unit=2/5, alt=false, line=0.2, solid=!$preview)
    makepoly(ldraw_lib__logo_train_2006_box(), step=step, col=col, unit=unit, alt=alt, line=line, solid=solid);
ldraw_lib__logo_train_2006_box(line=0.2);
// file: ../p/box3u12.scad
use <../lib.scad>
function ldraw_lib__box3u12() = [
// 0 Box with 3 Parallel Faces without Any Edges
// 0 Name: box3u12.dat
// 0 Author: J.C. Tchang [tchang]
// 0 !LDRAW_ORG Primitive UPDATE 2014-02
// 0 !LICENSE Licensed under CC BY 4.0 : see CAreadme.txt
// 
// 0 BFC CERTIFY CCW
  [0,"BFC","CERTIFY"],
  [0,"BFC","CCW"],
// 
// 0 !HISTORY 2014-12-23 [PTadmin] Official Update 2014-02
// 
// 
// 4 16 -1 1 1 1 1 1 1 1 -1 -1 1 -1
  [4,16,-1,1,1,1,1,1,1,1,-1,-1,1,-1],
// 4 16 -1 1 1 -1 0 1 1 0 1 1 1 1
  [4,16,-1,1,1,-1,0,1,1,0,1,1,1,1],
// 4 16 1 1 -1 1 0 -1 -1 0 -1 -1 1 -1
  [4,16,1,1,-1,1,0,-1,-1,0,-1,-1,1,-1],
];
module ldraw_lib__box3u12(step=0, col=false, unit=2/5, alt=false, line=0.2, solid=!$preview)
    makepoly(ldraw_lib__box3u12(), step=step, col=col, unit=unit, alt=alt, line=line, solid=solid);
ldraw_lib__box3u12(line=0.2);
// file: ../p/1-4cyli.scad
use <../lib.scad>
function ldraw_lib__1_4cyli() = [
// 0 Cylinder 0.25
// 0 Name: 1-4cyli.dat
// 0 Author: James Jessiman
// 0 !LDRAW_ORG Primitive UPDATE 2012-01
// 0 !LICENSE Licensed under CC BY 4.0 : see CAreadme.txt
// 
// 0 BFC CERTIFY CCW
  [0,"BFC","CERTIFY"],
  [0,"BFC","CCW"],
// 
// 0 !HISTORY 2002-03-23 [sbliss] Added BFC statement.
// 0 !HISTORY 2002-04-25 [PTadmin] Official Update 2002-02
// 0 !HISTORY 2007-06-22 [PTadmin] Header formatted for Contributor Agreement
// 0 !HISTORY 2008-07-01 [PTadmin] Official Update 2008-01
// 0 !HISTORY 2012-02-16 [Philo] Changed to CCW
// 0 !HISTORY 2012-03-30 [PTadmin] Official Update 2012-01
// 
// 
// 4 16 1 1 0 0.9239 1 0.3827 0.9239 0 0.3827 1 0 0
  [4,16,1,1,0,0.9239,1,0.3827,0.9239,0,0.3827,1,0,0],
// 5 24 1 0 0 1 1 0 0.9239 0 0.3827 1 0 -1
  [5,24,1,0,0,1,1,0,0.9239,0,0.3827,1,0,-1],
// 4 16 0.9239 1 0.3827 0.7071 1 0.7071 0.7071 0 0.7071 0.9239 0 0.3827
  [4,16,0.9239,1,0.3827,0.7071,1,0.7071,0.7071,0,0.7071,0.9239,0,0.3827],
// 5 24 0.9239 0 0.3827 0.9239 1 0.3827 0.7071 0 0.7071 1 0 0
  [5,24,0.9239,0,0.3827,0.9239,1,0.3827,0.7071,0,0.7071,1,0,0],
// 4 16 0.7071 1 0.7071 0.3827 1 0.9239 0.3827 0 0.9239 0.7071 0 0.7071
  [4,16,0.7071,1,0.7071,0.3827,1,0.9239,0.3827,0,0.9239,0.7071,0,0.7071],
// 5 24 0.7071 0 0.7071 0.7071 1 0.7071 0.3827 0 0.9239 0.9239 0 0.3827
  [5,24,0.7071,0,0.7071,0.7071,1,0.7071,0.3827,0,0.9239,0.9239,0,0.3827],
// 4 16 0.3827 1 0.9239 0 1 1 0 0 1 0.3827 0 0.9239
  [4,16,0.3827,1,0.9239,0,1,1,0,0,1,0.3827,0,0.9239],
// 5 24 0.3827 0 0.9239 0.3827 1 0.9239 0 0 1 0.7071 0 0.7071
  [5,24,0.3827,0,0.9239,0.3827,1,0.9239,0,0,1,0.7071,0,0.7071],
// 5 24 0 0 1 0 1 1 0.3827 0 0.9239 -1 0 1
  [5,24,0,0,1,0,1,1,0.3827,0,0.9239,-1,0,1],
];
module ldraw_lib__1_4cyli(step=0, col=false, unit=2/5, alt=false, line=0.2, solid=!$preview)
    makepoly(ldraw_lib__1_4cyli(), step=step, col=col, unit=unit, alt=alt, line=line, solid=solid);
ldraw_lib__1_4cyli(line=0.2);
// file: ../p/1-4chrd.scad
use <../lib.scad>
function ldraw_lib__1_4chrd() = [
// 0 Chord 0.25
// 0 Name: 1-4chrd.dat
// 0 Author: Max Martin Richter [MMR1988]
// 0 !LDRAW_ORG Primitive UPDATE 2023-05
// 0 !LICENSE Licensed under CC BY 4.0 : see CAreadme.txt
// 
// 0 BFC CERTIFY CCW
  [0,"BFC","CERTIFY"],
  [0,"BFC","CCW"],
// 
// 0 !HISTORY 2004-04-22 [PTadmin] Official Update 2004-02
// 0 !HISTORY 2007-10-09 [PTadmin] Header formatted for Contributor Agreement
// 0 !HISTORY 2008-07-01 [PTadmin] Official Update 2008-01
// 0 !HISTORY 2012-08-02 [MMR1988] Re-creation with PrimGen2 and Rectifier
// 0 !HISTORY 2012-08-09 [PTadmin] Official Update 2012-02
// 0 !HISTORY 2023-10-27 [OrionP] Change author to MMR1988 from hafhead
// 0 !HISTORY 2023-10-31 [OrionP] Official Update 2023-05
// 
// 4 16 0.9239 0 0.3827 0.3827 0 0.9239 0 0 1 1 0 0
  [4,16,0.9239,0,0.3827,0.3827,0,0.9239,0,0,1,1,0,0],
// 3 16 0.7071 0 0.7071 0.3827 0 0.9239 0.9239 0 0.3827
  [3,16,0.7071,0,0.7071,0.3827,0,0.9239,0.9239,0,0.3827],
];
module ldraw_lib__1_4chrd(step=0, col=false, unit=2/5, alt=false, line=0.2, solid=!$preview)
    makepoly(ldraw_lib__1_4chrd(), step=step, col=col, unit=unit, alt=alt, line=line, solid=solid);
ldraw_lib__1_4chrd(line=0.2);
// main file
use <../lib.scad>
use <../p/1-4chrd.scad>
use <../p/1-4cyli.scad>
use <../p/box3u12.scad>
use <../p/logo-train-2006-box.scad>
use <../p/logo-train-2006.scad>
function ldraw_lib__6316625a() = [
// 0 Sticker  0.8 x  3.8  with White Train Logo (2006) on Dark Azure Background
// 0 Name: 6316625a.dat
// 0 Author: Gerald Lasser [GeraldLasser]
// 0 !LDRAW_ORG Part UPDATE 2023-07
// 0 !LICENSE Licensed under CC BY 4.0 : see CAreadme.txt
// 
// 0 BFC CERTIFY CCW
  [0,"BFC","CERTIFY"],
  [0,"BFC","CCW"],
// 
// 0 !KEYWORDS Set 60336
// 
// 0 !HISTORY 2023-12-31 [OrionP] Official Update 2023-07
// 
// 
// 0 // Box
// 1 16 0 -.25 0 37 0 0 0 .25 0 0 0 8 box3u12.dat
  [1,16,0,-.25,0,37,0,0,0,.25,0,0,0,8, ldraw_lib__box3u12()],
// 
// 1 16 -37 -.25 7 -1 0 0 0 .25 0 0 0 1 1-4cyli.dat
  [1,16,-37,-.25,7,-1,0,0,0,.25,0,0,0,1, ldraw_lib__1_4cyli()],
// 1 16 -37 0 7 -1 0 0 0 -1 0 0 0 1 1-4chrd.dat
  [1,16,-37,0,7,-1,0,0,0,-1,0,0,0,1, ldraw_lib__1_4chrd()],
// 1 16 37 -.25 7 1 0 0 0 .25 0 0 0 1 1-4cyli.dat
  [1,16,37,-.25,7,1,0,0,0,.25,0,0,0,1, ldraw_lib__1_4cyli()],
// 1 16 37 0 7 1 0 0 0 -1 0 0 0 1 1-4chrd.dat
  [1,16,37,0,7,1,0,0,0,-1,0,0,0,1, ldraw_lib__1_4chrd()],
// 1 16 -37 -.25 -7 -1 0 0 0 .25 0 0 0 -1 1-4cyli.dat
  [1,16,-37,-.25,-7,-1,0,0,0,.25,0,0,0,-1, ldraw_lib__1_4cyli()],
// 1 16 -37 0 -7 -1 0 0 0 -1 0 0 0 -1 1-4chrd.dat
  [1,16,-37,0,-7,-1,0,0,0,-1,0,0,0,-1, ldraw_lib__1_4chrd()],
// 1 16 37 -.25 -7 1 0 0 0 .25 0 0 0 -1 1-4cyli.dat
  [1,16,37,-.25,-7,1,0,0,0,.25,0,0,0,-1, ldraw_lib__1_4cyli()],
// 1 16 37 0 -7 1 0 0 0 -1 0 0 0 -1 1-4chrd.dat
  [1,16,37,0,-7,1,0,0,0,-1,0,0,0,-1, ldraw_lib__1_4chrd()],
// 4 16 38 0 -7 37 0 -8 37 0 8 38 0 7
  [4,16,38,0,-7,37,0,-8,37,0,8,38,0,7],
// 4 16 -38 0 -7 -38 0 7 -37 0 8 -37 0 -8
  [4,16,-38,0,-7,-38,0,7,-37,0,8,-37,0,-8],
// 4 16 38 -.25 -7 38 0 -7 38 0 7 38 -.25 7
  [4,16,38,-.25,-7,38,0,-7,38,0,7,38,-.25,7],
// 4 16 -38 0 7 -38 0 -7 -38 -.25 -7 -38 -.25 7
  [4,16,-38,0,7,-38,0,-7,-38,-.25,-7,-38,-.25,7],
// 
// 0 // Pattern
// 1 321 -37 -.25 7 -1 0 0 0 1 0 0 0 1 1-4chrd.dat
  [1,321,-37,-.25,7,-1,0,0,0,1,0,0,0,1, ldraw_lib__1_4chrd()],
// 1 321 37 -.25 7 1 0 0 0 1 0 0 0 1 1-4chrd.dat
  [1,321,37,-.25,7,1,0,0,0,1,0,0,0,1, ldraw_lib__1_4chrd()],
// 1 321 -37 -.25 -7 -1 0 0 0 1 0 0 0 -1 1-4chrd.dat
  [1,321,-37,-.25,-7,-1,0,0,0,1,0,0,0,-1, ldraw_lib__1_4chrd()],
// 1 321 37 -.25 -7 1 0 0 0 1 0 0 0 -1 1-4chrd.dat
  [1,321,37,-.25,-7,1,0,0,0,1,0,0,0,-1, ldraw_lib__1_4chrd()],
// 
// 1 15 0 0 0 .55 0 0 0 1 0 0 0 .55 logo-train-2006.dat
  [1,15,0,0,0,.55,0,0,0,1,0,0,0,.55, ldraw_lib__logo_train_2006()],
// 1 321 0 0 0 .55 0 0 0 1 0 0 0 .55 logo-train-2006-box.dat
  [1,321,0,0,0,.55,0,0,0,1,0,0,0,.55, ldraw_lib__logo_train_2006_box()],
// 
// 4 321 -37 -.25 8 -38 -.25 7 -38 -.25 -7 -37 -.25 -8
  [4,321,-37,-.25,8,-38,-.25,7,-38,-.25,-7,-37,-.25,-8],
// 4 321 37 -.25 -8 38 -.25 -7 38 -.25 7 37 -.25 8
  [4,321,37,-.25,-8,38,-.25,-7,38,-.25,7,37,-.25,8],
// 
// 3 321 -37 -.25 8 -19.25 -.25 6.6 -11.86141 -.25 6.42279
  [3,321,-37,-.25,8,-19.25,-.25,6.6,-11.86141,-.25,6.42279],
// 3 321 -37 -.25 8 -11.86141 -.25 6.42279 -6.6 -.25 6.6
  [3,321,-37,-.25,8,-11.86141,-.25,6.42279,-6.6,-.25,6.6],
// 3 321 -37 -.25 8 -6.6 -.25 6.6 0 -.25 6.6
  [3,321,-37,-.25,8,-6.6,-.25,6.6,0,-.25,6.6],
// 3 321 -37 -.25 8 0 -.25 6.6 37 -.25 8
  [3,321,-37,-.25,8,0,-.25,6.6,37,-.25,8],
// 3 321 37 -.25 8 0 -.25 6.6 6.6 -.25 6.6
  [3,321,37,-.25,8,0,-.25,6.6,6.6,-.25,6.6],
// 3 321 37 -.25 8 6.6 -.25 6.6 11.86141 -.25 6.42279
  [3,321,37,-.25,8,6.6,-.25,6.6,11.86141,-.25,6.42279],
// 3 321 37 -.25 8 11.86141 -.25 6.42279 19.25 -.25 6.6
  [3,321,37,-.25,8,11.86141,-.25,6.42279,19.25,-.25,6.6],
// 3 321 37 -.25 8 19.25 -.25 6.6 19.25 -.25 0
  [3,321,37,-.25,8,19.25,-.25,6.6,19.25,-.25,0],
// 3 321 37 -.25 8 19.25 -.25 0 37 -.25 -8
  [3,321,37,-.25,8,19.25,-.25,0,37,-.25,-8],
// 3 321 37 -.25 -8 19.25 -.25 0 19.25 -.25 -6.6
  [3,321,37,-.25,-8,19.25,-.25,0,19.25,-.25,-6.6],
// 3 321 -19.25 -.25 6.6 -37 -.25 8 -19.25 -.25 0
  [3,321,-19.25,-.25,6.6,-37,-.25,8,-19.25,-.25,0],
// 3 321 -19.25 -.25 0 -37 -.25 8 -37 -.25 -8
  [3,321,-19.25,-.25,0,-37,-.25,8,-37,-.25,-8],
// 3 321 -19.25 -.25 0 -37 -.25 -8 -19.25 -.25 -6.6
  [3,321,-19.25,-.25,0,-37,-.25,-8,-19.25,-.25,-6.6],
// 3 321 -11.86141 -.25 -6.42279 -19.25 -.25 -6.6 -37 -.25 -8
  [3,321,-11.86141,-.25,-6.42279,-19.25,-.25,-6.6,-37,-.25,-8],
// 3 321 -11.86141 -.25 -6.42279 -37 -.25 -8 -6.6 -.25 -6.6
  [3,321,-11.86141,-.25,-6.42279,-37,-.25,-8,-6.6,-.25,-6.6],
// 3 321 -6.6 -.25 -6.6 -37 -.25 -8 0 -.25 -6.6
  [3,321,-6.6,-.25,-6.6,-37,-.25,-8,0,-.25,-6.6],
// 3 321 0 -.25 -6.6 -37 -.25 -8 37 -.25 -8
  [3,321,0,-.25,-6.6,-37,-.25,-8,37,-.25,-8],
// 3 321 0 -.25 -6.6 37 -.25 -8 6.6 -.25 -6.6
  [3,321,0,-.25,-6.6,37,-.25,-8,6.6,-.25,-6.6],
// 3 321 11.86141 -.25 -6.42279 6.6 -.25 -6.6 37 -.25 -8
  [3,321,11.86141,-.25,-6.42279,6.6,-.25,-6.6,37,-.25,-8],
// 3 321 19.25 -.25 -6.6 11.86141 -.25 -6.42279 37 -.25 -8
  [3,321,19.25,-.25,-6.6,11.86141,-.25,-6.42279,37,-.25,-8],
];
module ldraw_lib__6316625a(step=0, col=false, unit=2/5, alt=false, line=0.2, solid=!$preview)
    makepoly(ldraw_lib__6316625a(), step=step, col=col, unit=unit, alt=alt, line=line, solid=solid);
ldraw_lib__6316625a(line=0.2);
